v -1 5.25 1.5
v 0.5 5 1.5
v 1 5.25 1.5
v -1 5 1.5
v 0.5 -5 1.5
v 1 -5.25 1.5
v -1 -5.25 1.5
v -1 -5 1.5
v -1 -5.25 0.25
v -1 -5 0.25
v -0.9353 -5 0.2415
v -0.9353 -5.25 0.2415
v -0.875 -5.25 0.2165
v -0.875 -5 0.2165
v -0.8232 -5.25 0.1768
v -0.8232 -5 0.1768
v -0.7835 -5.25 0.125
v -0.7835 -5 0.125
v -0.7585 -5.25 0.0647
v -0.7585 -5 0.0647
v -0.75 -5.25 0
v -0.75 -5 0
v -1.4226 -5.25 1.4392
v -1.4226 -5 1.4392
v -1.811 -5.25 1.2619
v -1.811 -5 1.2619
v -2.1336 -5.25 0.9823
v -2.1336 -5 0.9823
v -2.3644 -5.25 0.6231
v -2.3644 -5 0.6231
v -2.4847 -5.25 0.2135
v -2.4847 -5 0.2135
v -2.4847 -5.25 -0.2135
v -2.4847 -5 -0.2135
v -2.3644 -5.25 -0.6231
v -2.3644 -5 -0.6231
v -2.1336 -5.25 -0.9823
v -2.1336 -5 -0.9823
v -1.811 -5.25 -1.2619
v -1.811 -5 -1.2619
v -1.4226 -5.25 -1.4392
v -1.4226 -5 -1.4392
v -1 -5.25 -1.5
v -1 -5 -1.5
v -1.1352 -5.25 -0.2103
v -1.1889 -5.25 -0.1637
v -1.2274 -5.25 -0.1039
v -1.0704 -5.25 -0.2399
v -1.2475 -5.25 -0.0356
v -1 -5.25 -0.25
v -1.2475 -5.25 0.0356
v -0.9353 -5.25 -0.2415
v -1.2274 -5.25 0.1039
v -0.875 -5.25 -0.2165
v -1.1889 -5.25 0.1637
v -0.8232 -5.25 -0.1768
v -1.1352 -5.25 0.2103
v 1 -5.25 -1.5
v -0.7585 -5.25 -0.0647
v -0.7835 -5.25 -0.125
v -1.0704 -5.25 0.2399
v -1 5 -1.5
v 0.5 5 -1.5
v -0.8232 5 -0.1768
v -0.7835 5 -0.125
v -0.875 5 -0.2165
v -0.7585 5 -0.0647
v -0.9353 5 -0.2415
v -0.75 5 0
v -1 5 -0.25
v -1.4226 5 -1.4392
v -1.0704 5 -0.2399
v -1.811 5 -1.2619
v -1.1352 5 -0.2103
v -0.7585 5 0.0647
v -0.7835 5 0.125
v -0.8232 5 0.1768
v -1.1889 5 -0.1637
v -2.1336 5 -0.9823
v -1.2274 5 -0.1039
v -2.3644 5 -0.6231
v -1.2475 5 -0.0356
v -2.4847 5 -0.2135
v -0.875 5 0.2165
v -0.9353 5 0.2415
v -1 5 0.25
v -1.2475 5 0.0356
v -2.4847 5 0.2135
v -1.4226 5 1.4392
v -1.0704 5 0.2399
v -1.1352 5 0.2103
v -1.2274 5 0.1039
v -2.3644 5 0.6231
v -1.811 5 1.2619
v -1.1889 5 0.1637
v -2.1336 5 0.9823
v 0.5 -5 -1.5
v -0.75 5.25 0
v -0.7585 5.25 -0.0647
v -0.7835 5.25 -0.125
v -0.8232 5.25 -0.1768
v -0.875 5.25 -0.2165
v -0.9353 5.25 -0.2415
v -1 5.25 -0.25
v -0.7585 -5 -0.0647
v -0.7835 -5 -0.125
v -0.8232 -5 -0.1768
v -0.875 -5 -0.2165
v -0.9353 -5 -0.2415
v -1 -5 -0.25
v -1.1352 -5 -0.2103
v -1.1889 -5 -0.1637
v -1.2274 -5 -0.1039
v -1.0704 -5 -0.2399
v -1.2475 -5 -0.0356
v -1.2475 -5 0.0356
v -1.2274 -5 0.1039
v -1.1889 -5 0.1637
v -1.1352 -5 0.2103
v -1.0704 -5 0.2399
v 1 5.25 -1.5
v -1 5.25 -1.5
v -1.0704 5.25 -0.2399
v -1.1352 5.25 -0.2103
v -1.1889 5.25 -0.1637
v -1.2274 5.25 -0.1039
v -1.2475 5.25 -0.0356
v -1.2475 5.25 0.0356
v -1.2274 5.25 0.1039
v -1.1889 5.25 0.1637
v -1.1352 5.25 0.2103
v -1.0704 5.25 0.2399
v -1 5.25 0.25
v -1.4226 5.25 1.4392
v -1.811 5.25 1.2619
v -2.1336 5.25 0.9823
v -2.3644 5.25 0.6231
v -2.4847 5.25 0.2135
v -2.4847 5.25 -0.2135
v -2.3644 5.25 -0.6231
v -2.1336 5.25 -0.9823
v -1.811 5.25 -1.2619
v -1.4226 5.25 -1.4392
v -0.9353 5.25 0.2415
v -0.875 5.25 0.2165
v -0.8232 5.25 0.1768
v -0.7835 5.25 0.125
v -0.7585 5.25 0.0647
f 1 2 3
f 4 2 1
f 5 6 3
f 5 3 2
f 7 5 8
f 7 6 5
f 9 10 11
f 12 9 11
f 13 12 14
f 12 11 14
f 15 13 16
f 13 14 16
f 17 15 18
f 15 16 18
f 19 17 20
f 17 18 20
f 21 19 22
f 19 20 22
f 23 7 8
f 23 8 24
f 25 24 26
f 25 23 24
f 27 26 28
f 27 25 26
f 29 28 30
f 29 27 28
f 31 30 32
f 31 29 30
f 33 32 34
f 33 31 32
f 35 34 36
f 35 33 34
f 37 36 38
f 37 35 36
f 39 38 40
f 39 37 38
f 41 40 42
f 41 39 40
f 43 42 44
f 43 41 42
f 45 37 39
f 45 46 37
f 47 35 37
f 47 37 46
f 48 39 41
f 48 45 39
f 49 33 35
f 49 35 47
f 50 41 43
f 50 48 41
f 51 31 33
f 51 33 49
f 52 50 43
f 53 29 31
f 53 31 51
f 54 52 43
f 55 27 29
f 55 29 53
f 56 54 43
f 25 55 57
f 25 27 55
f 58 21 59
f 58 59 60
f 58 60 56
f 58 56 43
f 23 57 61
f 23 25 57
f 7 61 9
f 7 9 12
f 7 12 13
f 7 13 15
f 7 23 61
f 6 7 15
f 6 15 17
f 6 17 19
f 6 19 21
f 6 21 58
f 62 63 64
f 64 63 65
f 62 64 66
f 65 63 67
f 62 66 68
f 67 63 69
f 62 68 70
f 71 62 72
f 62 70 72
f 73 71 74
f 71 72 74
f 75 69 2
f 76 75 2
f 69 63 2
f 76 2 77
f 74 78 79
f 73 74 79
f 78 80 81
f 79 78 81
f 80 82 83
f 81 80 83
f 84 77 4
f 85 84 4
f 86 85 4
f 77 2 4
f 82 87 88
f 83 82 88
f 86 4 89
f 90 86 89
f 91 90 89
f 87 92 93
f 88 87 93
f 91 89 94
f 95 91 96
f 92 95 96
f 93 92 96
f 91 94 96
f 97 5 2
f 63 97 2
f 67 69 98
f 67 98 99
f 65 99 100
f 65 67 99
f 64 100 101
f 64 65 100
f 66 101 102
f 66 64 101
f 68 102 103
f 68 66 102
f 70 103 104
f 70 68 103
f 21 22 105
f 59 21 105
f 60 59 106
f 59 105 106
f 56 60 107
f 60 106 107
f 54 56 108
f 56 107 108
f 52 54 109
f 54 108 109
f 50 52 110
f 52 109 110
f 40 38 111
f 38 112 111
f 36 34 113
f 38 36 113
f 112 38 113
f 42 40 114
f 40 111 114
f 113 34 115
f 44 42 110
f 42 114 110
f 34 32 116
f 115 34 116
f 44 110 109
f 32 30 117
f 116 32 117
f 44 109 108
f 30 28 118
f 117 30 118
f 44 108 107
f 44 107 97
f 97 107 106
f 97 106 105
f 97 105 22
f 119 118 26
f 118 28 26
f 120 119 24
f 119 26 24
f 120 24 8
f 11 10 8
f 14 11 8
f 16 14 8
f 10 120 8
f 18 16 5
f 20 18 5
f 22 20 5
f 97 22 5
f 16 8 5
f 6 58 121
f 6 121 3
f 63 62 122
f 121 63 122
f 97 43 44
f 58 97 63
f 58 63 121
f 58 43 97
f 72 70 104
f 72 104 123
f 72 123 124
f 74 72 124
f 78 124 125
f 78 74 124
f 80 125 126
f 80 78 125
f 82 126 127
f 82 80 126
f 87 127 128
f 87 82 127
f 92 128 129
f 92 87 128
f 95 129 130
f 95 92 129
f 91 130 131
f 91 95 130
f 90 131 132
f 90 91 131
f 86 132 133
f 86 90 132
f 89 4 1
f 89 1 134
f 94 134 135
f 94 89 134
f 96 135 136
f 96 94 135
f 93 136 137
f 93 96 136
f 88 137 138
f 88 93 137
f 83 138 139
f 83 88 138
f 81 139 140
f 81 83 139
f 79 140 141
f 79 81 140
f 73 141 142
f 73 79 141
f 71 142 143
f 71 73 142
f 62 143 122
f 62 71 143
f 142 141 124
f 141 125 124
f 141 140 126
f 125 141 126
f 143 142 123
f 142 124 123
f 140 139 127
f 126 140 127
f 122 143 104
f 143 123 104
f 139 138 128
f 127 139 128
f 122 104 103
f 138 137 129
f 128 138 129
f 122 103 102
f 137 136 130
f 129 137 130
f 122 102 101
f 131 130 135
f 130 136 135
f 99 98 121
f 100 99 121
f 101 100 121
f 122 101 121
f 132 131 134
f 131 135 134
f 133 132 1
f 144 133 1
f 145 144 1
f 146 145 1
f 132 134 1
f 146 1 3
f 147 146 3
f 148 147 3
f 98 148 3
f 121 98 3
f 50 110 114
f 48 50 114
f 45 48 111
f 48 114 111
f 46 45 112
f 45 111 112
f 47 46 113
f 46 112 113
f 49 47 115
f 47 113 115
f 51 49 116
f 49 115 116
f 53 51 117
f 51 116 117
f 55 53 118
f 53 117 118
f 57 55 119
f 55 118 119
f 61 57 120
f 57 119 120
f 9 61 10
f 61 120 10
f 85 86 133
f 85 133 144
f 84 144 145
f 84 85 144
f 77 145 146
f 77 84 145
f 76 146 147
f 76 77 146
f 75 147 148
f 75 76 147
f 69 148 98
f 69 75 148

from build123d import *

# Parameters (mm, degrees)
F1_DEPTH = 5.25
F3_DEPTH = 5


# Not quite as in the source:
# - a feature names something its author has since deleted; it is built from what else it names


with BuildPart() as f1:
    # F0 (on Front) → F1 (new body, symmetric)
    with BuildSketch(Plane.XZ):
        with BuildLine():
            Line((-1, 0.25), (-1, 1.5))
            ThreePointArc((-1, 1.5), (-2.5, 0), (-1, -1.5))
            Line((-1, -1.5), (-1, -0.25))
            ThreePointArc((-1, -0.25), (-1.25, 0), (-1, 0.25))
        make_face()
        with BuildLine():
            ThreePointArc((0.5, 0), (0.0606601718, 1.0606601718), (-1, 1.5))
            Line((-1, 1.5), (-1, 0.25))
            ThreePointArc((-1, 0.25), (-0.8232233047, 0.1767766953), (-0.75, 0))
            ThreePointArc((-0.75, 0), (-0.8232233047, -0.1767766953), (-1, -0.25))
            Line((-1, -0.25), (-1, -1.5))
            ThreePointArc((-1, -1.5), (0.0606601718, -1.0606601718), (0.5, 0))
        make_face()
        with BuildLine():
            Line((1, 1.5), (-1, 1.5))
            ThreePointArc((-1, 1.5), (0.0606601718, 1.0606601718), (0.5, 0))
            ThreePointArc((0.5, 0), (0.0606601718, -1.0606601718), (-1, -1.5))
            Line((-1, -1.5), (1, -1.5))
            Line((1, -1.5), (1, 1.5))
        make_face()
    extrude(amount=F1_DEPTH, both=True)

    # F2 (on face) → F3 (cut, symmetric)
    with BuildSketch(Plane.XY.offset(1.5)):
        Polygon((-1, -4.9999998882), (0.5, -4.9999998882), (0.5, 4.9999998882), (-1, 4.9999998882), (-6.6263522021, 4.9999998882), (-6.6263522021, -4.9999998882), align=None)
    extrude(amount=F3_DEPTH, both=True, mode=Mode.SUBTRACT)


solid = f1.part
